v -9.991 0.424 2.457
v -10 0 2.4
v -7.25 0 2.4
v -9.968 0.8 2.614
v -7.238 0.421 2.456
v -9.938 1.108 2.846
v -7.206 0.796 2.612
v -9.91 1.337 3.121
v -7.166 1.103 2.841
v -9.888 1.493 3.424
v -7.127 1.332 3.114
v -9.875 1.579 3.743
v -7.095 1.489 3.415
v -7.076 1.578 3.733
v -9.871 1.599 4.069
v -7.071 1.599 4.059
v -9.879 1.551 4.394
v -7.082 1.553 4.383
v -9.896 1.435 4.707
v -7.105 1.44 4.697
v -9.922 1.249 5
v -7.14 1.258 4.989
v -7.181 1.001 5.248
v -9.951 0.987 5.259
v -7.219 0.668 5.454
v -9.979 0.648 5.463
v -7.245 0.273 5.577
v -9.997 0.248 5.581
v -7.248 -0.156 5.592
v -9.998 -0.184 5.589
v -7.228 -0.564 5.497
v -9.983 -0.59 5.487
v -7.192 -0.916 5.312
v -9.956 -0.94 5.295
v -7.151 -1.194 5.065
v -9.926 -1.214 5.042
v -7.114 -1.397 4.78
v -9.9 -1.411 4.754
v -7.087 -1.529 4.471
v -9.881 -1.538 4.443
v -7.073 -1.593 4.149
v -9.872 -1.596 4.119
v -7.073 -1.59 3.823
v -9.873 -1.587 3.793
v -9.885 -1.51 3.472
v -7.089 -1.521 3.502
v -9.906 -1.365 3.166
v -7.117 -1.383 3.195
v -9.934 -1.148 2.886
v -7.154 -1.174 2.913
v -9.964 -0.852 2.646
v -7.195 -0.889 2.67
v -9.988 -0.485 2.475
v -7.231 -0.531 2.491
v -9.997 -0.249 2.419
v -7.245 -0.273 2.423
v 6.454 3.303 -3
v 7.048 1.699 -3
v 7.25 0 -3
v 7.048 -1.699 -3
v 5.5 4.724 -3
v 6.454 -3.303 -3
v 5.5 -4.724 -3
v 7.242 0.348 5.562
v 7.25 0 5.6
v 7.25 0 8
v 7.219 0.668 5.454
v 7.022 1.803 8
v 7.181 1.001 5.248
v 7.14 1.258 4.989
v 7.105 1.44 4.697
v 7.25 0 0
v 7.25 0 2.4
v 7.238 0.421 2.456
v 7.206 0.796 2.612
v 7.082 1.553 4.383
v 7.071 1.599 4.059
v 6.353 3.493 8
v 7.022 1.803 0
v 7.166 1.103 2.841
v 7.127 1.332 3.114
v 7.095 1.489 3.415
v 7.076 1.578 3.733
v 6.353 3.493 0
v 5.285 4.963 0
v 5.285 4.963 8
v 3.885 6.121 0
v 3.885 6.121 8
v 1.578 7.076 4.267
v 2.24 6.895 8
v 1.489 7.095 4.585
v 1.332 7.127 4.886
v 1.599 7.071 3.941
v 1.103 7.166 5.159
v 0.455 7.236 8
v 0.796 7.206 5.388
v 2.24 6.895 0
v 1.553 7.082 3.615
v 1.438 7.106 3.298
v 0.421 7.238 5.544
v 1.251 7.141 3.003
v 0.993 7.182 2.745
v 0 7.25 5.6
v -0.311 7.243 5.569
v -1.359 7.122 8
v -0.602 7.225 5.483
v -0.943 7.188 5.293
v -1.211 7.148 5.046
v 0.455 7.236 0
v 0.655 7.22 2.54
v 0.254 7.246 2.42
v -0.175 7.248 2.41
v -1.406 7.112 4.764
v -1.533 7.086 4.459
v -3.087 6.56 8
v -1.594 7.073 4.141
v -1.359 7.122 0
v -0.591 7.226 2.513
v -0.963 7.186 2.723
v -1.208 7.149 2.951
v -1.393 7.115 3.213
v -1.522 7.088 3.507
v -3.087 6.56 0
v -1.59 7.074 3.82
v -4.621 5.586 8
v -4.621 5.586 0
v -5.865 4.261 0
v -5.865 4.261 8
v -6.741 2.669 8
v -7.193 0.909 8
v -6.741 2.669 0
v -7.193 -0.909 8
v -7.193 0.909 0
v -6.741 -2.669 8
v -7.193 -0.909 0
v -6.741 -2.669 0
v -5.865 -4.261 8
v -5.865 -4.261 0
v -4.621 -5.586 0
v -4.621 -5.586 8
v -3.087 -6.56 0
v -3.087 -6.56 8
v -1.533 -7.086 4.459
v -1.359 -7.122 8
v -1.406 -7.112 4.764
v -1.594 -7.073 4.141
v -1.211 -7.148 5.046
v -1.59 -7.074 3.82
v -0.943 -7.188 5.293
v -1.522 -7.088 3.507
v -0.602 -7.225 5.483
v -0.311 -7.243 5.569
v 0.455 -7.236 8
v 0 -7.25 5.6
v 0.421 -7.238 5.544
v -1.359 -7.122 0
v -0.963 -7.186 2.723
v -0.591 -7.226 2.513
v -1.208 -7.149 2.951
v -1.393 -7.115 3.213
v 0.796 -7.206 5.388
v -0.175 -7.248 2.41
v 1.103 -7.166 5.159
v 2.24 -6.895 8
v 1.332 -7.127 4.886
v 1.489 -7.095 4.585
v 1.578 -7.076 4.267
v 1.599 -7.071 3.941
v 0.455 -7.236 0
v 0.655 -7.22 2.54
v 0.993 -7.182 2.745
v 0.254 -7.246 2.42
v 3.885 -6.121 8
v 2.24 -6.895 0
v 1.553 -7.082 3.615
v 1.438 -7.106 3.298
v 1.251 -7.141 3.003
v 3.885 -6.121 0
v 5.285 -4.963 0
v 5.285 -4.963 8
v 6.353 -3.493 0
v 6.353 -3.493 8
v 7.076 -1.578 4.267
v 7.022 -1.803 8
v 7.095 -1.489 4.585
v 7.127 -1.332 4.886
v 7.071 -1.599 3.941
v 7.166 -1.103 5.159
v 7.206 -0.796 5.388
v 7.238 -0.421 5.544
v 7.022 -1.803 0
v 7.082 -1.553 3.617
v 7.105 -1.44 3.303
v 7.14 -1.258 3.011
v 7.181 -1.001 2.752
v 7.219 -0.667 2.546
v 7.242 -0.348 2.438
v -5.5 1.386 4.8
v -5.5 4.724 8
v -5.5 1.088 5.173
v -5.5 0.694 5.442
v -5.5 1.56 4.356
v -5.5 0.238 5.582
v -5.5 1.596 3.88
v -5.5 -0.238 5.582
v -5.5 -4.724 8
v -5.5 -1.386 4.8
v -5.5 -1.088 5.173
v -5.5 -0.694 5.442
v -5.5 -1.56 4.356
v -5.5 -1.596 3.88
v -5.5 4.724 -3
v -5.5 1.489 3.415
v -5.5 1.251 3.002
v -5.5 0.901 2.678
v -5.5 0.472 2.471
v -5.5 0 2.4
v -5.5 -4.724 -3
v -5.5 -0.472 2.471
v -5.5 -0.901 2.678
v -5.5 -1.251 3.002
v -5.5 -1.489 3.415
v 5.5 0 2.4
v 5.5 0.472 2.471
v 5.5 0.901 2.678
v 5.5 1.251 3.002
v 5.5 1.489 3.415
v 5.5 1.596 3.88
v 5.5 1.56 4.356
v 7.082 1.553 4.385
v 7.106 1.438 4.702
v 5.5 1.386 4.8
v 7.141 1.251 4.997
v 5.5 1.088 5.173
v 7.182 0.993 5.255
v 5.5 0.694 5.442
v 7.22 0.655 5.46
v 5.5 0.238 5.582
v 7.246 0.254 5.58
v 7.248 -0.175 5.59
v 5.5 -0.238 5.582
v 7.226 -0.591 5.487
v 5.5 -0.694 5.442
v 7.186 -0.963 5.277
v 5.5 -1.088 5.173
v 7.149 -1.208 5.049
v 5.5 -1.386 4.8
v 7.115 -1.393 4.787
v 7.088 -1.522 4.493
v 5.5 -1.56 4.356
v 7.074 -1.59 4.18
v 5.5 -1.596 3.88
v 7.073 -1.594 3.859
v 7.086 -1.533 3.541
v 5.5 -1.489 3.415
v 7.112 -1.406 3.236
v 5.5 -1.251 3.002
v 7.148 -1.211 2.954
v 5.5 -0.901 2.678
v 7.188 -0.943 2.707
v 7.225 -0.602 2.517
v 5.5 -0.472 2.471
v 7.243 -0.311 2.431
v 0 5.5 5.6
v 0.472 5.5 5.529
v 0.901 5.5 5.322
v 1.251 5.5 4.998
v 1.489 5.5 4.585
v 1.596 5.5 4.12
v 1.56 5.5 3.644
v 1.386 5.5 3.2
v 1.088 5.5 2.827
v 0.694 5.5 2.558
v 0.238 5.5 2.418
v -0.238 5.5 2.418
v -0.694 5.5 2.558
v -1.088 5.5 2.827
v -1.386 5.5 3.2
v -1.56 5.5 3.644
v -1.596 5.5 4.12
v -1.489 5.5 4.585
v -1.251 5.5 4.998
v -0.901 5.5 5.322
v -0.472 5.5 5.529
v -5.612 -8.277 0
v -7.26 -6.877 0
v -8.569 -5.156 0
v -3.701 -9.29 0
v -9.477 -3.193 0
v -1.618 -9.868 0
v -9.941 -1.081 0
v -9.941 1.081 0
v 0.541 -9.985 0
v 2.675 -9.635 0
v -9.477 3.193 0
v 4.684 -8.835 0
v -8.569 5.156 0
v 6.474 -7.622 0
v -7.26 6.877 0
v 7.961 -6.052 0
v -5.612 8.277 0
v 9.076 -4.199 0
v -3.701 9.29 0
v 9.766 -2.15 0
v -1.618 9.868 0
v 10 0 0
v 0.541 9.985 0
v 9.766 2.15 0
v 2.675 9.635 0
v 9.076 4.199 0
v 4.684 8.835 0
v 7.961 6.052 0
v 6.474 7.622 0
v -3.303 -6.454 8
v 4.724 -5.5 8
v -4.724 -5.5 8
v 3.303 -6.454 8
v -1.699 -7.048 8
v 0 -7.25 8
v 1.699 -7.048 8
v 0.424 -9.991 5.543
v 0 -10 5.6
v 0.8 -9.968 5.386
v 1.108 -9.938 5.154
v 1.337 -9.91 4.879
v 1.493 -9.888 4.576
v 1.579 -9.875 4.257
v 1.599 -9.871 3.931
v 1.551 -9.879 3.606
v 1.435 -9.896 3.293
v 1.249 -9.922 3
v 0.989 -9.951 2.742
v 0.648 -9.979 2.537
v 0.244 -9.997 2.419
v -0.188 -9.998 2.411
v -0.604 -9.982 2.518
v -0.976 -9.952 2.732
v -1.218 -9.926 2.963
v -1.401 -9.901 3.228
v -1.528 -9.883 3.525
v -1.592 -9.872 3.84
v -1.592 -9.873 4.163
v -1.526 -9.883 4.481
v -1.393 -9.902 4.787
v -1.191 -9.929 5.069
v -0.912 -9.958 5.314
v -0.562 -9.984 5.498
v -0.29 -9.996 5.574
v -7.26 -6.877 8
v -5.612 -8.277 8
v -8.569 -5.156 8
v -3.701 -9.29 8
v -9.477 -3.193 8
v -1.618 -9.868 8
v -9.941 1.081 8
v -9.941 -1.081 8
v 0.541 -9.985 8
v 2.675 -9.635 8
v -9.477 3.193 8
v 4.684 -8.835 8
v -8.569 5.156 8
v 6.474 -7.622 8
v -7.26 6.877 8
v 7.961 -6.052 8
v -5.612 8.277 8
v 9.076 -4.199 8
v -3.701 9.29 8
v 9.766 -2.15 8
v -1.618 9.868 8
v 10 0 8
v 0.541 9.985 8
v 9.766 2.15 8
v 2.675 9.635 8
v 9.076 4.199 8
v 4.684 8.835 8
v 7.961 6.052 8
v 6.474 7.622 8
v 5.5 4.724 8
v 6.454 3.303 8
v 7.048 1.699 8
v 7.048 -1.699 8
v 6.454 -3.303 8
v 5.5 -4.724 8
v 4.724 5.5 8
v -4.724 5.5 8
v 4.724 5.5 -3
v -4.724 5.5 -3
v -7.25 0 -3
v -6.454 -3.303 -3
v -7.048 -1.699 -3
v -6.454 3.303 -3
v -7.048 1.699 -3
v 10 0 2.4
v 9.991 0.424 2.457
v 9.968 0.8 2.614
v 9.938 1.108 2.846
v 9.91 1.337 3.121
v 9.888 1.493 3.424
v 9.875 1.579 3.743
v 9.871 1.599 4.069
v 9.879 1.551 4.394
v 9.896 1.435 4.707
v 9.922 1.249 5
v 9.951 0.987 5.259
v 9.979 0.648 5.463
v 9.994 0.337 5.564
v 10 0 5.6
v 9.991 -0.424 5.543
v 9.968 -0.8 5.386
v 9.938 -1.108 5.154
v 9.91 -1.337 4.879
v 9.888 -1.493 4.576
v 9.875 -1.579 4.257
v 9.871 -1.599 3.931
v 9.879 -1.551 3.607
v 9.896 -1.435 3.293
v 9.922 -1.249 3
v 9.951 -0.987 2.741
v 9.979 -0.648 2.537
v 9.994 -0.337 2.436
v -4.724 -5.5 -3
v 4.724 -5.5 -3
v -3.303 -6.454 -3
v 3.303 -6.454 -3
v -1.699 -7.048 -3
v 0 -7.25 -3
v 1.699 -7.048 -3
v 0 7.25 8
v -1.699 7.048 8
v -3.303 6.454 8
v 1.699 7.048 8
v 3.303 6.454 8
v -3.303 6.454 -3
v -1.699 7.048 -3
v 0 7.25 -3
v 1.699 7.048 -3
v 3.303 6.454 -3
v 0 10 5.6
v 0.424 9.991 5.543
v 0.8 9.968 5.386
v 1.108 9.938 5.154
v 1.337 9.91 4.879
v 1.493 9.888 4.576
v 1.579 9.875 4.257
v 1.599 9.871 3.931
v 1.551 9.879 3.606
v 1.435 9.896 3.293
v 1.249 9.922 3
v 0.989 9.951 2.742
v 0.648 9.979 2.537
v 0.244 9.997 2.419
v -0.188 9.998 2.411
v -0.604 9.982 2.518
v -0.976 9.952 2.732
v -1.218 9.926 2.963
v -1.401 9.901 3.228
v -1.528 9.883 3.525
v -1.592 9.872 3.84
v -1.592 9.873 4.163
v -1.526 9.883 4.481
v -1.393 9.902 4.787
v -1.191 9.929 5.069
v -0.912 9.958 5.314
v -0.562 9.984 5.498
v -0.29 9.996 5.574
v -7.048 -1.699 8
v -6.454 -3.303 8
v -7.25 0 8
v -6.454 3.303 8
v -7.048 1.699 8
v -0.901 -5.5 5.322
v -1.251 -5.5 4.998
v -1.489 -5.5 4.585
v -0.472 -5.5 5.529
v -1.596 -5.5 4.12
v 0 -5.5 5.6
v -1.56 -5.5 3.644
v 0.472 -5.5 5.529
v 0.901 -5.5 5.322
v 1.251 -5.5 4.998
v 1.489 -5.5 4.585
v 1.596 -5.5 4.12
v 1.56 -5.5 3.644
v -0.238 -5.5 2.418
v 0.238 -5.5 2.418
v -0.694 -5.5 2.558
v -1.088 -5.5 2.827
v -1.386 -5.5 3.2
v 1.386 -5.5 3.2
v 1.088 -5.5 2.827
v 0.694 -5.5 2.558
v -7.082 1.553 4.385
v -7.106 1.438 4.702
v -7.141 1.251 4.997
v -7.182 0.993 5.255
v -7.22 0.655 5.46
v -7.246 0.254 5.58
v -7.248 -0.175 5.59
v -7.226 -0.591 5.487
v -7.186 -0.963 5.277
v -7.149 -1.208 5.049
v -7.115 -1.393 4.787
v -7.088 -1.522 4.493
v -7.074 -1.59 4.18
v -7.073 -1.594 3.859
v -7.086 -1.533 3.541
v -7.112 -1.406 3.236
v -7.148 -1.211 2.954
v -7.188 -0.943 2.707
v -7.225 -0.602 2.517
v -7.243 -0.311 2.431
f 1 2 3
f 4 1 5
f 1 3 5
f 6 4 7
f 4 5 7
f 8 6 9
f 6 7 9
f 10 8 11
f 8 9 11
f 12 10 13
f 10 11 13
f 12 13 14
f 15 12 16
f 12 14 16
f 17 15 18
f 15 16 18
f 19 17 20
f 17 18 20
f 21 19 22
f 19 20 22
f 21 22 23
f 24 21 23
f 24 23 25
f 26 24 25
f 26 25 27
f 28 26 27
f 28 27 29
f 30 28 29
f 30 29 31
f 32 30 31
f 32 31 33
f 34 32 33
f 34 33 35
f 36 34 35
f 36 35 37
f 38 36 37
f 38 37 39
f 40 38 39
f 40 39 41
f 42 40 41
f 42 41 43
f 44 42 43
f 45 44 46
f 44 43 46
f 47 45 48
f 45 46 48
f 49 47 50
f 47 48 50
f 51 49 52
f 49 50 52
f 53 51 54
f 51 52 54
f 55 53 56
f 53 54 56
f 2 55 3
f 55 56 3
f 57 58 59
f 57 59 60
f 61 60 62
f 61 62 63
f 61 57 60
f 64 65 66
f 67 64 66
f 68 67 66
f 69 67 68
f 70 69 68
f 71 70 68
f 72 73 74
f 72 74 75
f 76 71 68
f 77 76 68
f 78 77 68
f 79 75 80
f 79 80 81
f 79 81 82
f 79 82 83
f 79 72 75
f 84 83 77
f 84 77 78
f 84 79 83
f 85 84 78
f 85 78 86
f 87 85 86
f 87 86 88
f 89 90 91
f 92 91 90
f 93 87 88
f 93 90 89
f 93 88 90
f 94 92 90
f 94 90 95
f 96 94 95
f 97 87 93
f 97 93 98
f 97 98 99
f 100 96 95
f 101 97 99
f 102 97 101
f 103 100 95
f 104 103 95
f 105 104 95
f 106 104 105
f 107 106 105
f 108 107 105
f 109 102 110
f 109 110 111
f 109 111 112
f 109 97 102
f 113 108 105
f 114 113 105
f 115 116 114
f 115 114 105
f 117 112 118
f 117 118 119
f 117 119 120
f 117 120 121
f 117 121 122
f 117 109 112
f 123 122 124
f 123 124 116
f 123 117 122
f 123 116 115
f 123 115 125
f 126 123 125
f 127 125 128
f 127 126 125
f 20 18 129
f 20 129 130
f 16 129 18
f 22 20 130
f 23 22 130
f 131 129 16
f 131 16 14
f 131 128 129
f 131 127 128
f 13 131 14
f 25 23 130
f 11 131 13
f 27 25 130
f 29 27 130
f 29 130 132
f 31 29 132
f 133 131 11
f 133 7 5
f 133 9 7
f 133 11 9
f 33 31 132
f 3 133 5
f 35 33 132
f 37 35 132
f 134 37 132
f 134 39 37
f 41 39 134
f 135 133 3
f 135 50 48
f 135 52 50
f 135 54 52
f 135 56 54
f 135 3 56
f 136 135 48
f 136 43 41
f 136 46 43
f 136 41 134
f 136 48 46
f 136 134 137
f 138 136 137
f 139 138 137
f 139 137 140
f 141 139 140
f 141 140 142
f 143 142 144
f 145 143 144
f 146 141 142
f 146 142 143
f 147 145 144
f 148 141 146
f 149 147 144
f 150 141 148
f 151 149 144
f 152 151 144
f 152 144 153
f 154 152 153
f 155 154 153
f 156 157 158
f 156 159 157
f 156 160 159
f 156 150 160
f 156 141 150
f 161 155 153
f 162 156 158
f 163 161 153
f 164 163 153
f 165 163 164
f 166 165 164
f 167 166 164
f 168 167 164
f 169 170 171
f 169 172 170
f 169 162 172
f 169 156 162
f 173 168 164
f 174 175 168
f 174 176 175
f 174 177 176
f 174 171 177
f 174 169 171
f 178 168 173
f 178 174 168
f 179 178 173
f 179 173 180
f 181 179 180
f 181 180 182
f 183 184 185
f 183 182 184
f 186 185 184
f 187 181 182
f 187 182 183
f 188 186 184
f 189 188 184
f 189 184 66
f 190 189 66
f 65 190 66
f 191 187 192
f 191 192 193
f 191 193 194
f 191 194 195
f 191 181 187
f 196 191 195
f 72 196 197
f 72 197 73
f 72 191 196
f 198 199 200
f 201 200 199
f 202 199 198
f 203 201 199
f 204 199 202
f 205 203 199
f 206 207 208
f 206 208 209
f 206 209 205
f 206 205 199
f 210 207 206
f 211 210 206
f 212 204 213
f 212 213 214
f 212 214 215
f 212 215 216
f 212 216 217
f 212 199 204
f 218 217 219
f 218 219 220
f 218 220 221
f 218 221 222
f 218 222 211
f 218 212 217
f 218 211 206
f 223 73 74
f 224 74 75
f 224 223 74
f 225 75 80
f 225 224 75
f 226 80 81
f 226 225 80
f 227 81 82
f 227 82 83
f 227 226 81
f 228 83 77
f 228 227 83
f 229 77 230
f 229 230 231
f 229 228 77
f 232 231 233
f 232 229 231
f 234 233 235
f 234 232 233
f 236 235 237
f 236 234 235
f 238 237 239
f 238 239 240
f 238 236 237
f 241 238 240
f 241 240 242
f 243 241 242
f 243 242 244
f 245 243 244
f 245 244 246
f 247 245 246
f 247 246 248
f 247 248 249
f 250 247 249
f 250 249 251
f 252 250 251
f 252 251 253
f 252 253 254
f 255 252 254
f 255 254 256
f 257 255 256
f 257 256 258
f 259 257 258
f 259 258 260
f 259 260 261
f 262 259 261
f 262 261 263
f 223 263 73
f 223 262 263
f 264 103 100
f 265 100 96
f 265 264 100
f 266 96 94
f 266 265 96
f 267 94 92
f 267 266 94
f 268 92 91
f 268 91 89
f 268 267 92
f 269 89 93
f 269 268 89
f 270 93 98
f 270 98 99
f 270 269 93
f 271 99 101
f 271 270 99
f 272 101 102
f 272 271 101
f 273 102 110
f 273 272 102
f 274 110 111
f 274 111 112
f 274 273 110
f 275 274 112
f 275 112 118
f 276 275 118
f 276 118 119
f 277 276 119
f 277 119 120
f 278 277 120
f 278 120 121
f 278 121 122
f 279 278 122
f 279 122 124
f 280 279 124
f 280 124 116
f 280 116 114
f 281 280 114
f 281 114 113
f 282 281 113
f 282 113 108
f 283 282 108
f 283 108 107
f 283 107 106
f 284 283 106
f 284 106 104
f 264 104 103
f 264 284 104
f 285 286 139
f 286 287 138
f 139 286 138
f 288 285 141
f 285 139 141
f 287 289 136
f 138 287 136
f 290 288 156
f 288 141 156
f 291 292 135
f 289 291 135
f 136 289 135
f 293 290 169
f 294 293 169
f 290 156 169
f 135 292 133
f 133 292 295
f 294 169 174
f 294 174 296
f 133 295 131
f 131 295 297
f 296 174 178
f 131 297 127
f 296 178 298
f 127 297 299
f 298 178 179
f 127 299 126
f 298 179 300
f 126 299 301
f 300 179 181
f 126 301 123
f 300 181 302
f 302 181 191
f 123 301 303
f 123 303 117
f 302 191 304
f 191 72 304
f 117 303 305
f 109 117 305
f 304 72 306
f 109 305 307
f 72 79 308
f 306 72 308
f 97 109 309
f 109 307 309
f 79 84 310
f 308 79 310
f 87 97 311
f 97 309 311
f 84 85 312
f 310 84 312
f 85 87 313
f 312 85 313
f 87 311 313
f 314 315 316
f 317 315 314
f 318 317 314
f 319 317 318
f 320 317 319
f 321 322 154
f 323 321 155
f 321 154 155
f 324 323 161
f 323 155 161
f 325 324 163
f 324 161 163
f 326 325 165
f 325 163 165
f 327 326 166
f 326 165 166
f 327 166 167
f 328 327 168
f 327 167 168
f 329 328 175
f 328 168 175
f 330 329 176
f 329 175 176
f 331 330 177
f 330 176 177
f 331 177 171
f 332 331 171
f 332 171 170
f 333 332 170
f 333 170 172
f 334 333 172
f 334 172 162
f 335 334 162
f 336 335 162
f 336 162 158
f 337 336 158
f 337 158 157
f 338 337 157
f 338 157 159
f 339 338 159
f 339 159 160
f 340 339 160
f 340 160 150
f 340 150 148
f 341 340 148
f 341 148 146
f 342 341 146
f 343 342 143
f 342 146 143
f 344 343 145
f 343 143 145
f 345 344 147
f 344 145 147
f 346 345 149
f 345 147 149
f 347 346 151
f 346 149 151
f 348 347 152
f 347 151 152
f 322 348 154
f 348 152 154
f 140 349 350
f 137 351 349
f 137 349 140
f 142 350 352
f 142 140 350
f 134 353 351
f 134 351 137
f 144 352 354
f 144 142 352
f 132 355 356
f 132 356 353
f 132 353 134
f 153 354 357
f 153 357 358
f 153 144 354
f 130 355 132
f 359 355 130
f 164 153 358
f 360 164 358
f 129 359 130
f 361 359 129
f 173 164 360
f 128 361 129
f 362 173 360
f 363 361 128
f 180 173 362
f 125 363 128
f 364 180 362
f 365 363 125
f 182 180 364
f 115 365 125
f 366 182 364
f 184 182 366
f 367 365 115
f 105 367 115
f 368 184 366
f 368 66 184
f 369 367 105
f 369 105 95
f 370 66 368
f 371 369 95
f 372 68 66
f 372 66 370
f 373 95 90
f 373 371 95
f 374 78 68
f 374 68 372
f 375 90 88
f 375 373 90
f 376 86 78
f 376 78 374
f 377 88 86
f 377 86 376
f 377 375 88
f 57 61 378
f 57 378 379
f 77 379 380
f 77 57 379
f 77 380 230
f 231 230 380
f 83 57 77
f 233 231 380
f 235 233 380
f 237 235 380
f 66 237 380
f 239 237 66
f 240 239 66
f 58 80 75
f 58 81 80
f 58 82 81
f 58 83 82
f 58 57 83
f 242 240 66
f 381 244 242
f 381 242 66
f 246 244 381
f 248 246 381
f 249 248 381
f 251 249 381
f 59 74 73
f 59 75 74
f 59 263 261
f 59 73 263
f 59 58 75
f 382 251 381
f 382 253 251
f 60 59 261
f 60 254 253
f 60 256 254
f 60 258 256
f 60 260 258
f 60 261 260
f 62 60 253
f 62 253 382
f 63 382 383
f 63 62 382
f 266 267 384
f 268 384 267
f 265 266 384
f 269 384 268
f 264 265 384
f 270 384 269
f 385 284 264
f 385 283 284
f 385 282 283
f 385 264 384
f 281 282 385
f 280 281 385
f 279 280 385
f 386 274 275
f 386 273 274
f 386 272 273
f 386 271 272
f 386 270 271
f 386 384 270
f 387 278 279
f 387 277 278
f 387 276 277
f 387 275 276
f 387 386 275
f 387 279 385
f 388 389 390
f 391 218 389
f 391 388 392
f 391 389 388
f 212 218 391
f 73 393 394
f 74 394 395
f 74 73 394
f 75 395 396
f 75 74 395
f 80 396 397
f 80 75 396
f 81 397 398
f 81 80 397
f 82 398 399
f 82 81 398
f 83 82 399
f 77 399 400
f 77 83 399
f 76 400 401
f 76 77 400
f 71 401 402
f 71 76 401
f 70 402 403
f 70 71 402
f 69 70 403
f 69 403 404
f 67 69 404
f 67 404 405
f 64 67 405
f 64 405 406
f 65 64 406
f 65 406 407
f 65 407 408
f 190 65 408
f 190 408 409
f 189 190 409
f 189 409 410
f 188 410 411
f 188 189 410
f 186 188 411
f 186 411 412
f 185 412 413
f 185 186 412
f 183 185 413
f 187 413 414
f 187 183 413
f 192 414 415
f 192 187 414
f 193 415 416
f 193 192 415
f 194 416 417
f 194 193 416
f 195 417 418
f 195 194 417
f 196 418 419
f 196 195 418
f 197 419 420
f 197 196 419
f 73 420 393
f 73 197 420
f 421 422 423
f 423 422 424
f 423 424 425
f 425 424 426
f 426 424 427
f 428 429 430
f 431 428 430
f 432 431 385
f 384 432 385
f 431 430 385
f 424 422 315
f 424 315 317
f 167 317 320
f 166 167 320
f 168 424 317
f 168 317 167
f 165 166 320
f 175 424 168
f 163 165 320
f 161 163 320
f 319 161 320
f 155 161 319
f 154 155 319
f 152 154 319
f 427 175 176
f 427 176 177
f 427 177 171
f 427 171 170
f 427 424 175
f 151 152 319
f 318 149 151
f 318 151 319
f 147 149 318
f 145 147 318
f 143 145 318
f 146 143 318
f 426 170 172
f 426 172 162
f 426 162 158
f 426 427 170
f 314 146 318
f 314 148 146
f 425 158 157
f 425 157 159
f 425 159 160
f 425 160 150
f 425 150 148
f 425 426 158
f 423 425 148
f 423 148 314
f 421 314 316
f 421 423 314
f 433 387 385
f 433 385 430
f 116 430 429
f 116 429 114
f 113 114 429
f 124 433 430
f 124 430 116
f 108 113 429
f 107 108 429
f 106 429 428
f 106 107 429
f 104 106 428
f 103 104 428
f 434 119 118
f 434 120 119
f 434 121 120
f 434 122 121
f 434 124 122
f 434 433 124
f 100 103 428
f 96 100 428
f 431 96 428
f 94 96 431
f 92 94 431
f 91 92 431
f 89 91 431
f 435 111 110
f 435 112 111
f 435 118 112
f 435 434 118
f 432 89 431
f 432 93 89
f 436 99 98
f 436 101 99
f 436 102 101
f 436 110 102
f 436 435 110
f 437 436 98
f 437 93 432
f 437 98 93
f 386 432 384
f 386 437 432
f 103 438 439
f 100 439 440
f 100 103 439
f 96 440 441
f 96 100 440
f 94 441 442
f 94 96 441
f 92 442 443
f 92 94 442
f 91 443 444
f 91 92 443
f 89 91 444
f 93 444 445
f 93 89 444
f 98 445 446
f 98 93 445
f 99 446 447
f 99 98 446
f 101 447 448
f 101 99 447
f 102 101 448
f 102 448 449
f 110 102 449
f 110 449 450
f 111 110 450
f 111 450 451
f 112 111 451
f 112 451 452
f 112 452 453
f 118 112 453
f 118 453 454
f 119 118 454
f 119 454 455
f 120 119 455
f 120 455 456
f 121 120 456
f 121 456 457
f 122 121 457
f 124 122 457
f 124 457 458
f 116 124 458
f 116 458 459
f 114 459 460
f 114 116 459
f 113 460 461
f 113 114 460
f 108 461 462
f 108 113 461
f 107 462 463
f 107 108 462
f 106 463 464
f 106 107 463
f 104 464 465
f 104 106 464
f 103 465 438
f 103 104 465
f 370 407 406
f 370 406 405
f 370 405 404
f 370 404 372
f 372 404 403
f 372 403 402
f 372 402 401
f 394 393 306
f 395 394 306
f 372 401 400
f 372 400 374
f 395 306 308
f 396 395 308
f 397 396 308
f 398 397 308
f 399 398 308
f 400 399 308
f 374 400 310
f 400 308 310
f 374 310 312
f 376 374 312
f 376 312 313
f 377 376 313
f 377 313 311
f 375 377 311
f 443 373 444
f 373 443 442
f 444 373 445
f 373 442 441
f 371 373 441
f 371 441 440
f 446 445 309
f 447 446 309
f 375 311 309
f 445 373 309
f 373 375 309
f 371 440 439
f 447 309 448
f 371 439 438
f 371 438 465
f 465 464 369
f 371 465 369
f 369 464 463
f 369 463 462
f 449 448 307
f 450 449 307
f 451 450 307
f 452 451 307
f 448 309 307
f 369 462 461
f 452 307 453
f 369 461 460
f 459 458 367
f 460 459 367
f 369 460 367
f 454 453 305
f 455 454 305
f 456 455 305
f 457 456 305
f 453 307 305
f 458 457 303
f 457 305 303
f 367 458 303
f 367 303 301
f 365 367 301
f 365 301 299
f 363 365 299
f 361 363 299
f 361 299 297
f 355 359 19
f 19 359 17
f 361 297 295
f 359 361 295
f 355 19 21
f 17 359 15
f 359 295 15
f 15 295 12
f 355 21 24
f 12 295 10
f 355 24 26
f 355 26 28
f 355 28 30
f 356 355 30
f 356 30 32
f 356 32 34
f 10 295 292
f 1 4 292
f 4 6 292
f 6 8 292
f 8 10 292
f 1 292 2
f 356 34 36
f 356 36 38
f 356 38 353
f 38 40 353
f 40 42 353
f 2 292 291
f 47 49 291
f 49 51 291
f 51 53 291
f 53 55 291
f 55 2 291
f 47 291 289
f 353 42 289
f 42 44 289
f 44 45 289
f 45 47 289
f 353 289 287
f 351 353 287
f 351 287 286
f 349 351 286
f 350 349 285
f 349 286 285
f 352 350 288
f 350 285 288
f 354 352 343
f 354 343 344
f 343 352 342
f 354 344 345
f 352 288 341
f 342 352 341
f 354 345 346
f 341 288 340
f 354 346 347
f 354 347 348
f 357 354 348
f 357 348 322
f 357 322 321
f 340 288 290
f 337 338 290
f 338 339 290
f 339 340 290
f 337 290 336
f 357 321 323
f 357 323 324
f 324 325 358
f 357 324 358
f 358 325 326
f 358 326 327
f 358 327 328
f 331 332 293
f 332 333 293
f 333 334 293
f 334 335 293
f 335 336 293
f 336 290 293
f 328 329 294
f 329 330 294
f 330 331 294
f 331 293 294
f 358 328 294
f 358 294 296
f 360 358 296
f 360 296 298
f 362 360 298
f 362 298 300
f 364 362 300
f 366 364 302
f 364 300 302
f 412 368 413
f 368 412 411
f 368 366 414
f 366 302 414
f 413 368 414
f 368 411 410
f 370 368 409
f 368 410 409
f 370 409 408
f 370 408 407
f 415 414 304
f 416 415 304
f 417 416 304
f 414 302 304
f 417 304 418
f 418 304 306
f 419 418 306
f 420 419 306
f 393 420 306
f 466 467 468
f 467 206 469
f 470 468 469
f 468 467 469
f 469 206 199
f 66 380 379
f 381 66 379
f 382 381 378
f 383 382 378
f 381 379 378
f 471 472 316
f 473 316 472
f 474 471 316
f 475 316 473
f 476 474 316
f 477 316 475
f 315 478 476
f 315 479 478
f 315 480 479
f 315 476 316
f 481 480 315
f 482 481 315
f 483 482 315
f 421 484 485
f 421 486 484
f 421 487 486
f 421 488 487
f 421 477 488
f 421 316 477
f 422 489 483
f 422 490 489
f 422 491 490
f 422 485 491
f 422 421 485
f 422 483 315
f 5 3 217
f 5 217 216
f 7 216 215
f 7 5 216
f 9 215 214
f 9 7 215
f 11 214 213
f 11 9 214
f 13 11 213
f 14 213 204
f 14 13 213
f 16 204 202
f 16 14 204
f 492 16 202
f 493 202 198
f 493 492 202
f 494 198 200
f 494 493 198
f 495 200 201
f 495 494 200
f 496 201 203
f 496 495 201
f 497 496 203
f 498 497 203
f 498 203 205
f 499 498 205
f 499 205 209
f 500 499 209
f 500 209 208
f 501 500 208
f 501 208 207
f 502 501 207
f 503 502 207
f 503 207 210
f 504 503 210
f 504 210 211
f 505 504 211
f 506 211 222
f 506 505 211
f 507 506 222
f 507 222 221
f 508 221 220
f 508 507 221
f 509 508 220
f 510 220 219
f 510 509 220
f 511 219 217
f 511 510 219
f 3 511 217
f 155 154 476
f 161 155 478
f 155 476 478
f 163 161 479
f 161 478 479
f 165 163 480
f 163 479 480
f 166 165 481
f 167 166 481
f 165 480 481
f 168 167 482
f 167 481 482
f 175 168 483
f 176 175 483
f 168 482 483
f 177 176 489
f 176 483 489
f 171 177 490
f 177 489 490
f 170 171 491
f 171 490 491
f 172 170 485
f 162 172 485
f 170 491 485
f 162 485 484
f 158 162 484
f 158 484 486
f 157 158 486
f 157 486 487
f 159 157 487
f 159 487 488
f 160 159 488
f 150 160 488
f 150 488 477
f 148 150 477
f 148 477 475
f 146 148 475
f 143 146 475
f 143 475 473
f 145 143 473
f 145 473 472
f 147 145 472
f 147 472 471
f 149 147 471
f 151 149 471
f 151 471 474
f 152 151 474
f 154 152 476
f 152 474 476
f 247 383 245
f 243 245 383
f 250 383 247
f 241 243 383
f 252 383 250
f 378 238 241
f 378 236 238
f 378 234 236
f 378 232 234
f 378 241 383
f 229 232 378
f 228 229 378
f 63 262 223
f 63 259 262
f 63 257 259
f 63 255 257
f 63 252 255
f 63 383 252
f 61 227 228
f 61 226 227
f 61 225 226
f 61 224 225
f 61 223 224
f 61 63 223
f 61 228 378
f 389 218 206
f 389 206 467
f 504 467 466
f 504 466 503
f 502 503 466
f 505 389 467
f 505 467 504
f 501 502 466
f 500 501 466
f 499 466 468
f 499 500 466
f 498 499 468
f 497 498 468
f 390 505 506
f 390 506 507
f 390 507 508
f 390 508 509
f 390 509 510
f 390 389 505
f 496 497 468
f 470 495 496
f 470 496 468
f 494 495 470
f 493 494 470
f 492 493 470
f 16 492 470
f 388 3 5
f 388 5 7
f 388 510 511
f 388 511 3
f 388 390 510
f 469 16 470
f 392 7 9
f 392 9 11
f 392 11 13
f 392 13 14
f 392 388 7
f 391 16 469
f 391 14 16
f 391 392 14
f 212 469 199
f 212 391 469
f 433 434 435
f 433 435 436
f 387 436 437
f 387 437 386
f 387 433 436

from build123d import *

# Parameters (mm, degrees)
SKETCH_1_R               = 10
SKETCH_1_R_2             = 7.25
EXTRUDE_1_DEPTH          = 8
SKETCH_2_R               = 1.6
CUT_EXTRUDE_1_DEPTH      = 17.248076809
SKETCH_3_R               = 1.6
CUT_EXTRUDE_2_DEPTH      = 17.248076998
EXTRUDE_2_DEPTH          = 8
EXTRUDE_2_DEPTH_BACK     = 3
EXTRUDE_2_2_DEPTH        = 8
EXTRUDE_2_2_DEPTH_BACK   = 3
EXTRUDE_2_3_DEPTH        = 8
EXTRUDE_2_3_DEPTH_BACK   = 3
EXTRUDE_2_4_DEPTH        = 8
EXTRUDE_2_4_DEPTH_BACK   = 3
SKETCH_2_2_R             = 1.6
CUT_EXTRUDE_3_DEPTH      = 17.248076998
CUT_EXTRUDE_5_DEPTH      = 17.248076998
CUT_EXTRUDE_5_DEPTH_BACK = 17.248076998
SKETCH_3_3_R             = 1.6
SKETCH_2_3_R             = 1.6
CUT_EXTRUDE_6_DEPTH      = 17.248076998


with BuildPart() as part:
    # 草图1 → 凸台-拉伸1 (new body)
    with BuildSketch(Plane.XY):
        Circle(SKETCH_1_R)
        Circle(SKETCH_1_R_2, mode=Mode.SUBTRACT)
    extrude(amount=EXTRUDE_1_DEPTH)

    # 草图2 → 切除-拉伸1 (cut, through all)
    with BuildSketch(Plane(origin=(0, 0, 0), x_dir=(1, 0, 0), z_dir=(0, 1, 0))):
        with Locations((0, -4)):
            Circle(SKETCH_2_R)
    extrude(amount=-CUT_EXTRUDE_1_DEPTH, mode=Mode.SUBTRACT)

    # 草图3 → 切除-拉伸2 (cut, through all)
    with BuildSketch(Plane(origin=(0, 0, 0), x_dir=(0, 0, -1), z_dir=(1, 0, 0))):
        with Locations((-4, 0)):
            Circle(SKETCH_3_R)
    extrude(amount=-CUT_EXTRUDE_2_DEPTH, mode=Mode.SUBTRACT)


with BuildPart() as body_2:
    # 草图5 → 凸台-拉伸2 (new, two sides: drawn at the far end of the back side and taken through both)
    with BuildSketch(Plane.XY.offset(-EXTRUDE_2_DEPTH_BACK)):
        with BuildLine():
            Line((4.723610907, 5.5), (-4.723610907, 5.5))
            ThreePointArc((-4.723610907, 5.5), (0, 7.25), (4.723610907, 5.5))
        make_face()
    extrude(amount=EXTRUDE_2_DEPTH + EXTRUDE_2_DEPTH_BACK)


with BuildPart() as body_3:
    # 草图5 → Extrude 2 2 (new, two sides: drawn at the far end of the back side and taken through both)
    with BuildSketch(Plane.XY.offset(-EXTRUDE_2_2_DEPTH_BACK)):
        with BuildLine():
            Line((5.5, -4.723610907), (5.5, 4.723610907))
            ThreePointArc((5.5, 4.723610907), (7.25, 0), (5.5, -4.723610907))
        make_face()
    extrude(amount=EXTRUDE_2_2_DEPTH + EXTRUDE_2_2_DEPTH_BACK)


with BuildPart() as body_4:
    # 草图5 → Extrude 2 3 (new, two sides: drawn at the far end of the back side and taken through both)
    with BuildSketch(Plane.XY.offset(-EXTRUDE_2_3_DEPTH_BACK)):
        with BuildLine():
            Line((-4.723610907, -5.5), (4.723610907, -5.5))
            ThreePointArc((4.723610907, -5.5), (0, -7.25), (-4.723610907, -5.5))
        make_face()
    extrude(amount=EXTRUDE_2_3_DEPTH + EXTRUDE_2_3_DEPTH_BACK)

    # 草图2<2> → 切除-拉伸3 (cut, through all)
    with BuildSketch(Plane(origin=(0, 0, 0), x_dir=(1, 0, 0), z_dir=(0, 1, 0))):
        with Locations((0, -4)):
            Circle(SKETCH_2_2_R)
    extrude(amount=-CUT_EXTRUDE_3_DEPTH, mode=Mode.SUBTRACT)


with BuildPart() as body_5:
    # 草图5 → Extrude 2 4 (new, two sides: drawn at the far end of the back side and taken through both)
    with BuildSketch(Plane.XY.offset(-EXTRUDE_2_4_DEPTH_BACK)):
        with BuildLine():
            Line((-5.5, 4.723610907), (-5.5, -4.723610907))
            ThreePointArc((-5.5, -4.723610907), (-7.25, 0), (-5.5, 4.723610907))
        make_face()
    extrude(amount=EXTRUDE_2_4_DEPTH + EXTRUDE_2_4_DEPTH_BACK)


with BuildPart() as cut_extrude_5_tool:
    # 草图3<3> → 切除-拉伸5 (new, two sides: drawn at the far end of the back side and taken through both)
    with BuildSketch(Plane(origin=(0, 0, 0), x_dir=(0, 0, -1), z_dir=(1, 0, 0)).offset(-CUT_EXTRUDE_5_DEPTH_BACK)):
        with Locations((-4, 0)):
            Circle(SKETCH_3_3_R)
    extrude(amount=CUT_EXTRUDE_5_DEPTH + CUT_EXTRUDE_5_DEPTH_BACK)


with BuildPart() as part_1:
    add(part.part)

    # 切除-拉伸5: cut by cut_extrude_5_tool
    add(cut_extrude_5_tool.part, mode=Mode.SUBTRACT)


with BuildPart() as body_3_1:
    add(body_3.part)

    # 切除-拉伸5: cut by cut_extrude_5_tool
    add(cut_extrude_5_tool.part, mode=Mode.SUBTRACT)


with BuildPart() as body_5_1:
    add(body_5.part)

    # 切除-拉伸5: cut by cut_extrude_5_tool
    add(cut_extrude_5_tool.part, mode=Mode.SUBTRACT)


with BuildPart() as cut_extrude_6_tool:
    # 草图2<3> → 切除-拉伸6 (new, through all)
    with BuildSketch(Plane(origin=(0, 0, 0), x_dir=(1, 0, 0), z_dir=(0, 1, 0))):
        with Locations((0, -4)):
            Circle(SKETCH_2_3_R)
    extrude(amount=CUT_EXTRUDE_6_DEPTH)


with BuildPart() as part_2:
    add(part_1.part)

    # 切除-拉伸6: cut by cut_extrude_6_tool
    add(cut_extrude_6_tool.part, mode=Mode.SUBTRACT)


with BuildPart() as body_2_1:
    add(body_2.part)

    # 切除-拉伸6: cut by cut_extrude_6_tool
    add(cut_extrude_6_tool.part, mode=Mode.SUBTRACT)


solid = Compound([body_4.part, body_3_1.part, body_5_1.part, part_2.part, body_2_1.part])
